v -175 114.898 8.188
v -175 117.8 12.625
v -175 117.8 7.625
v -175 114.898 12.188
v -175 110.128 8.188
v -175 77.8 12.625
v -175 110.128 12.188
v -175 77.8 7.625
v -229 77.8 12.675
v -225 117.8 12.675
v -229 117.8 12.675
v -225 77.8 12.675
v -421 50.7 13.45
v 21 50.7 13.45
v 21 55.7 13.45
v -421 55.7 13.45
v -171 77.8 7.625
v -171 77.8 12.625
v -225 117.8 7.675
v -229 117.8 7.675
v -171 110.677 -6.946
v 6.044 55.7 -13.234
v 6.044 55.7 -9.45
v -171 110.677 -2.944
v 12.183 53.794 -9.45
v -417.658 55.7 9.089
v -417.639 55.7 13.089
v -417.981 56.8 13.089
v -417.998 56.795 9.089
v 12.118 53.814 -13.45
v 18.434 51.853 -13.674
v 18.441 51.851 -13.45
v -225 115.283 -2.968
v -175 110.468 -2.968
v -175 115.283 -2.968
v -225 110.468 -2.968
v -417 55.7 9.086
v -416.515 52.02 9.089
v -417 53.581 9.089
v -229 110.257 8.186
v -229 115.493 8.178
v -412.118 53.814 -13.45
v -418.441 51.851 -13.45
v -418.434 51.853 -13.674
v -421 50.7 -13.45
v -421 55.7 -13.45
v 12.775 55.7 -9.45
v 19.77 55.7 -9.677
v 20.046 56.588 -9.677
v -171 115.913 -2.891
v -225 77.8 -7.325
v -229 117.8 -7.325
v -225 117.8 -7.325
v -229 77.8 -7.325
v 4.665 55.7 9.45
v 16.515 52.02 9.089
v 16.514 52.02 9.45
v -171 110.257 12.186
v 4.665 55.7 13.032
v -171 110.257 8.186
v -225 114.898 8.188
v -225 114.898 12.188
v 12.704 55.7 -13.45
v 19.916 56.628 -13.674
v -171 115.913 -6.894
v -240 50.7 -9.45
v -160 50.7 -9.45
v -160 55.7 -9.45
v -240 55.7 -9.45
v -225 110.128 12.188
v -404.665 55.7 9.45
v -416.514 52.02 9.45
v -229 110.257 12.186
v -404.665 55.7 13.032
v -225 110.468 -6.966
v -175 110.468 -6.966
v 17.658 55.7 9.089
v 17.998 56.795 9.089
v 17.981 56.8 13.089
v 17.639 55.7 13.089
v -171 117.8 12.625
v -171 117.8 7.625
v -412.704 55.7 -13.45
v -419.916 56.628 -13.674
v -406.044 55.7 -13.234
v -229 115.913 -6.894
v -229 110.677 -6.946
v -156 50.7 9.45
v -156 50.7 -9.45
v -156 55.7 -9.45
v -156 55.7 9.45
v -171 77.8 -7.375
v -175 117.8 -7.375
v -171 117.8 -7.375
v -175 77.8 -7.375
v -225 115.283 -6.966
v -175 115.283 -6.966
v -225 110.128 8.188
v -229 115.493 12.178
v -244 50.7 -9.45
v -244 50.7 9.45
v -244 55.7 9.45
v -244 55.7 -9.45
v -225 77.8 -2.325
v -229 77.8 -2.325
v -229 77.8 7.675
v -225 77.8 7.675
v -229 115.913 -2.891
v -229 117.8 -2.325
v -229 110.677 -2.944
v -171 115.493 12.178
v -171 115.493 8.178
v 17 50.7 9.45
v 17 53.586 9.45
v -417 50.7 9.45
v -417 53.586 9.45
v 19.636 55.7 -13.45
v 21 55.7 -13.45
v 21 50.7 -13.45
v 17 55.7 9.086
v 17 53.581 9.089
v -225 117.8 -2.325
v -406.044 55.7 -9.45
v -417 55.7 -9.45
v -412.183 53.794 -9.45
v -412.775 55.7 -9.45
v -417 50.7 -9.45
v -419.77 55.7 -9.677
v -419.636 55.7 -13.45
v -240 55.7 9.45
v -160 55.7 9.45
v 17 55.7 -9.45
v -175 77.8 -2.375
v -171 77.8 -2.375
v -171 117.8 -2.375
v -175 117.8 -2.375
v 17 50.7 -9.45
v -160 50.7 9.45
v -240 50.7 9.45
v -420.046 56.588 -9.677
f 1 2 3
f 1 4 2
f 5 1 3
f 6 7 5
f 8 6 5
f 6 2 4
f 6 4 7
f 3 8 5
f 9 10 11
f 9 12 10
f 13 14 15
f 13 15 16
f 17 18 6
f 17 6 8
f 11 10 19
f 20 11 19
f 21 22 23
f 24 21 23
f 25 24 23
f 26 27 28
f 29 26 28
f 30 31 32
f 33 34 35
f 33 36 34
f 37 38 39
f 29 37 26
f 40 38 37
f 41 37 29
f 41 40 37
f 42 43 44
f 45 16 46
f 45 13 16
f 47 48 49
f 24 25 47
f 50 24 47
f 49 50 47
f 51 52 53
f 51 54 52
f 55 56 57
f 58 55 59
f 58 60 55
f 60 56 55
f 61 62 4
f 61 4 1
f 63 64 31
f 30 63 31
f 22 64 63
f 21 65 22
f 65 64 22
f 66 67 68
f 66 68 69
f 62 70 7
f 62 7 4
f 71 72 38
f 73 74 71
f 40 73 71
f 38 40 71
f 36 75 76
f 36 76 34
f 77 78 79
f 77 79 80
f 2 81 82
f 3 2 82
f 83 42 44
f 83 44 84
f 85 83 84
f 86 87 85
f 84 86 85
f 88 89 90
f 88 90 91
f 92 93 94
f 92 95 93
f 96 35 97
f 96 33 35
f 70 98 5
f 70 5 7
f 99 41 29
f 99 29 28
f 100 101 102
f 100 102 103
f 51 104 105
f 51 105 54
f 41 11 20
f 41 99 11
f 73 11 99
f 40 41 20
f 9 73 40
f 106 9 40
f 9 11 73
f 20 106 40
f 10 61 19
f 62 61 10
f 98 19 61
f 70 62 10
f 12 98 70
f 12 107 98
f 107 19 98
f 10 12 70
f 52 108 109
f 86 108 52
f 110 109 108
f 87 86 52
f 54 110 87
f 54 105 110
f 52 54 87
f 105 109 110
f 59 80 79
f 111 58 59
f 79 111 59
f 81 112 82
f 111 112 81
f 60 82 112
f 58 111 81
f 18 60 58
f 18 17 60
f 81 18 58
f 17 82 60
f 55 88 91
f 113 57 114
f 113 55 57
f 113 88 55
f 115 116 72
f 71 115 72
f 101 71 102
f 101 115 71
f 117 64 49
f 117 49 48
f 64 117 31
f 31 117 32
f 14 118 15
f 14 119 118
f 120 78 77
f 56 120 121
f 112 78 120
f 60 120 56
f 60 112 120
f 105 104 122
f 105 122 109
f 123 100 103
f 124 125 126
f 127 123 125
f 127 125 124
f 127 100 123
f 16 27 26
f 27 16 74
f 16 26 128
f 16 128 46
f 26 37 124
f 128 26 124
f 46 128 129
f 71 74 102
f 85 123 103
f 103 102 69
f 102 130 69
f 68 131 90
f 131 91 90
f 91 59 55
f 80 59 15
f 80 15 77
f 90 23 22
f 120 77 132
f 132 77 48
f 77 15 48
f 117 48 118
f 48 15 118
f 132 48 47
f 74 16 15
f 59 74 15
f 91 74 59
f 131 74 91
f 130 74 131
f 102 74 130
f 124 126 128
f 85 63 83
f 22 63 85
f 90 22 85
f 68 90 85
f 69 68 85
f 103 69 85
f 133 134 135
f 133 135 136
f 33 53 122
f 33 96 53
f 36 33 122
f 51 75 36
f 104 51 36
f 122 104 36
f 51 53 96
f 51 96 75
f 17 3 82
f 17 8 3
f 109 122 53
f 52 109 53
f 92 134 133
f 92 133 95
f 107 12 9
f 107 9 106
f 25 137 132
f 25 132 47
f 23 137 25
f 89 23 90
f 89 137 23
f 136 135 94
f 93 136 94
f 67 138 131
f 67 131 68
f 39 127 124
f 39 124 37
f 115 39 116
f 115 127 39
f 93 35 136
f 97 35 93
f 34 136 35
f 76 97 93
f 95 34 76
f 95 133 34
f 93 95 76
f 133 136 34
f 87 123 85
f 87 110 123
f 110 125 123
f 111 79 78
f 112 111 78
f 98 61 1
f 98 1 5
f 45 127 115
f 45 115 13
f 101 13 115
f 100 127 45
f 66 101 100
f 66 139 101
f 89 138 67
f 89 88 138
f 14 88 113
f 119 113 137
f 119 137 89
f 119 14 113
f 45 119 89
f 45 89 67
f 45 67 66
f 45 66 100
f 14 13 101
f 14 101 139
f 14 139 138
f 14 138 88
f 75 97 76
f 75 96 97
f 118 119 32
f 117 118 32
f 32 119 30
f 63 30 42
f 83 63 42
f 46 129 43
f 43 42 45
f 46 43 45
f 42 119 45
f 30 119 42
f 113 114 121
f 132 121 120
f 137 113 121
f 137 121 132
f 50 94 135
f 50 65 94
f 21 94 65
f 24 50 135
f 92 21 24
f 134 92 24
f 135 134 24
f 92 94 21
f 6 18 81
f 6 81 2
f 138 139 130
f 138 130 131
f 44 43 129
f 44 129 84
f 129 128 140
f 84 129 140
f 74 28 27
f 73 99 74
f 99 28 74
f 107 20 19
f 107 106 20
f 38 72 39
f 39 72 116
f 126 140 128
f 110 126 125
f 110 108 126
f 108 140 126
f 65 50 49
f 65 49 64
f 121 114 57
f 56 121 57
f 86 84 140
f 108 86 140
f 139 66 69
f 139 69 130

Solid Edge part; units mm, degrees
sketch "Sketch1" plane through (0, 50.7, 0) normal (0, -1, 0) x (1, 0, 0)
  line L0 (21, 13.45) -> (-421, 13.45)
  line L1 (-421, 13.45) -> (-421, -13.45)
  line L2 (21, -13.45) -> (-421, -13.45)
  line L3 (21, -13.45) -> (21, 13.45)
  line L4 (-417, 9.45) -> (17, 9.45)
  line L5 (17, 9.45) -> (17, -9.45)
  line L6 (17, -9.45) -> (-417, -9.45)
  line L7 (-417, -9.45) -> (-417, 9.45)
  dimension "D1" = 4
  dimension "D2" = 4
  dimension "D3" = 1.8
  dimension "D4" = 1.8
  dimension "D5" = 18.9
  dimension "D6" = 4
  dimension "D7" = 18.9
  dimension "D8" = 4
  dimension "D9" = 434
  dimension "D10" = 26.9
  dimension "D11" = 4
extrude "Protrusion1" add sketch "Sketch1" against normal blind 5
sketch "Sketch2" plane through (0, 50.7, 0) normal (0, -1, 0) x (1, 0, 0)
  line L0 (-156, -9.45) -> (-156, 9.45)
  line L1 (-156, 9.45) -> (-160, 9.45)
  line L2 (-160, 9.45) -> (-160, -9.45)
  line L3 (-160, -9.45) -> (-156, -9.45)
  line L4 (-244, 9.45) -> (-244, -9.45)
  line L5 (-244, -9.45) -> (-240, -9.45)
  line L6 (-240, -9.45) -> (-240, 9.45)
  line L7 (-240, 9.45) -> (-244, 9.45)
  dimension "D1" = 4
  dimension "D2" = 4
  dimension "D3" = 1.8
  dimension "D4" = 1.8
  dimension "D5" = 18.9
  dimension "D6" = 4
  dimension "D7" = 18.9
  dimension "D8" = 4
  dimension "D9" = 434
  dimension "D10" = 26.9
  dimension "D11" = 4
extrude "ExtrudedProtrusion_2" add sketch "Sketch2" against normal blind 5
sketch "Sketch3" plane through (-200, 77.8, 0) normal (0, 1, 0) x (1, 0, 0)
  line L0 (-29, 2.3247) -> (-29, 7.3247)
  line L1 (-29, 7.3247) -> (-25, 7.3247)
  line L2 (-25, 7.3247) -> (-25, 2.3247)
  line L3 (-25, 2.3247) -> (-29, 2.3247)
  line L4 (-29, -12.6753) -> (-29, -7.6753)
  line L5 (-29, -7.6753) -> (-25, -7.6753)
  line L6 (-25, -7.6753) -> (-25, -12.6753)
  line L7 (-25, -12.6753) -> (-29, -12.6753)
  line L8 (29, -12.625) -> (25, -12.625)
  line L9 (25, -12.625) -> (25, -7.625)
  line L10 (25, -7.625) -> (29, -7.625)
  line L11 (29, -7.625) -> (29, -12.625)
  line L12 (25, 2.375) -> (25, 7.375)
  line L13 (25, 7.375) -> (29, 7.375)
  line L14 (29, 7.375) -> (29, 2.375)
  line L15 (29, 2.375) -> (25, 2.375)
extrude "ExtrudedProtrusion_3" add sketch "Sketch3" along normal blind 40
sketch "Sketch4" plane through (-229, 108.8, -7.375) normal (0.9545, 0.2964, 0.0339) x (0.2966, -0.955, 0)
  line L0 (-6.793, -0.4095) -> (-6.793, -4.4095)
  line L1 (-6.793, -4.4095) -> (-1.793, -4.4095)
  line L2 (-1.793, -4.4095) -> (-1.793, -0.4095)
  line L3 (-1.793, -0.4095) -> (-6.793, -0.4095)
extrude "ExtrudedProtrusion_6" add sketch "Sketch4" against normal blind 197.9 and the other way blind 2.75
sketch "Sketch5" plane through (-229, 108.8, 12.625) normal (0.955, 0.2966, -0.0046) x (0.2966, -0.955, 0)
  line L0 (-6.3917, 4.4374) -> (-6.3917, 0.4374)
  line L1 (-6.3917, 0.4374) -> (-1.3917, 0.4374)
  line L2 (-1.3917, 0.4374) -> (-1.3917, 4.4374)
  line L3 (-1.3917, 4.4374) -> (-6.3917, 4.4374)
extrude "ExtrudedProtrusion_8" add sketch "Sketch5" against normal blind 195.9 and the other way blind 2.3
mirror "Mirror1" about plane through (-200, 97.8, -4.8247) normal (1, 0, 0) of "ExtrudedProtrusion_6", "ExtrudedProtrusion_8"
sketch "Sketch6" plane through (-225, 97.8, -4.8247) normal (1, 0, 0) x (0, -1, 0)
  line L0 (-17.0981, -13.0124) -> (-12.3285, -13.0124)
  line L1 (-12.3285, -13.0124) -> (-12.3285, -17.0124)
  line L2 (-12.3285, -17.0124) -> (-17.0981, -17.0124)
  line L3 (-17.0981, -17.0124) -> (-17.0981, -13.0124)
  line L4 (-12.668, -1.8567) -> (-17.4833, -1.8567)
  line L5 (-17.4833, -1.8567) -> (-17.4833, 2.141)
  line L6 (-17.4833, 2.141) -> (-12.668, 2.141)
  line L7 (-12.668, 2.141) -> (-12.668, -1.8567)
extrude "Protrusion2" add sketch "Sketch6" along normal up to vertex (50 mm away)
properties material "Carbon Fiber"
